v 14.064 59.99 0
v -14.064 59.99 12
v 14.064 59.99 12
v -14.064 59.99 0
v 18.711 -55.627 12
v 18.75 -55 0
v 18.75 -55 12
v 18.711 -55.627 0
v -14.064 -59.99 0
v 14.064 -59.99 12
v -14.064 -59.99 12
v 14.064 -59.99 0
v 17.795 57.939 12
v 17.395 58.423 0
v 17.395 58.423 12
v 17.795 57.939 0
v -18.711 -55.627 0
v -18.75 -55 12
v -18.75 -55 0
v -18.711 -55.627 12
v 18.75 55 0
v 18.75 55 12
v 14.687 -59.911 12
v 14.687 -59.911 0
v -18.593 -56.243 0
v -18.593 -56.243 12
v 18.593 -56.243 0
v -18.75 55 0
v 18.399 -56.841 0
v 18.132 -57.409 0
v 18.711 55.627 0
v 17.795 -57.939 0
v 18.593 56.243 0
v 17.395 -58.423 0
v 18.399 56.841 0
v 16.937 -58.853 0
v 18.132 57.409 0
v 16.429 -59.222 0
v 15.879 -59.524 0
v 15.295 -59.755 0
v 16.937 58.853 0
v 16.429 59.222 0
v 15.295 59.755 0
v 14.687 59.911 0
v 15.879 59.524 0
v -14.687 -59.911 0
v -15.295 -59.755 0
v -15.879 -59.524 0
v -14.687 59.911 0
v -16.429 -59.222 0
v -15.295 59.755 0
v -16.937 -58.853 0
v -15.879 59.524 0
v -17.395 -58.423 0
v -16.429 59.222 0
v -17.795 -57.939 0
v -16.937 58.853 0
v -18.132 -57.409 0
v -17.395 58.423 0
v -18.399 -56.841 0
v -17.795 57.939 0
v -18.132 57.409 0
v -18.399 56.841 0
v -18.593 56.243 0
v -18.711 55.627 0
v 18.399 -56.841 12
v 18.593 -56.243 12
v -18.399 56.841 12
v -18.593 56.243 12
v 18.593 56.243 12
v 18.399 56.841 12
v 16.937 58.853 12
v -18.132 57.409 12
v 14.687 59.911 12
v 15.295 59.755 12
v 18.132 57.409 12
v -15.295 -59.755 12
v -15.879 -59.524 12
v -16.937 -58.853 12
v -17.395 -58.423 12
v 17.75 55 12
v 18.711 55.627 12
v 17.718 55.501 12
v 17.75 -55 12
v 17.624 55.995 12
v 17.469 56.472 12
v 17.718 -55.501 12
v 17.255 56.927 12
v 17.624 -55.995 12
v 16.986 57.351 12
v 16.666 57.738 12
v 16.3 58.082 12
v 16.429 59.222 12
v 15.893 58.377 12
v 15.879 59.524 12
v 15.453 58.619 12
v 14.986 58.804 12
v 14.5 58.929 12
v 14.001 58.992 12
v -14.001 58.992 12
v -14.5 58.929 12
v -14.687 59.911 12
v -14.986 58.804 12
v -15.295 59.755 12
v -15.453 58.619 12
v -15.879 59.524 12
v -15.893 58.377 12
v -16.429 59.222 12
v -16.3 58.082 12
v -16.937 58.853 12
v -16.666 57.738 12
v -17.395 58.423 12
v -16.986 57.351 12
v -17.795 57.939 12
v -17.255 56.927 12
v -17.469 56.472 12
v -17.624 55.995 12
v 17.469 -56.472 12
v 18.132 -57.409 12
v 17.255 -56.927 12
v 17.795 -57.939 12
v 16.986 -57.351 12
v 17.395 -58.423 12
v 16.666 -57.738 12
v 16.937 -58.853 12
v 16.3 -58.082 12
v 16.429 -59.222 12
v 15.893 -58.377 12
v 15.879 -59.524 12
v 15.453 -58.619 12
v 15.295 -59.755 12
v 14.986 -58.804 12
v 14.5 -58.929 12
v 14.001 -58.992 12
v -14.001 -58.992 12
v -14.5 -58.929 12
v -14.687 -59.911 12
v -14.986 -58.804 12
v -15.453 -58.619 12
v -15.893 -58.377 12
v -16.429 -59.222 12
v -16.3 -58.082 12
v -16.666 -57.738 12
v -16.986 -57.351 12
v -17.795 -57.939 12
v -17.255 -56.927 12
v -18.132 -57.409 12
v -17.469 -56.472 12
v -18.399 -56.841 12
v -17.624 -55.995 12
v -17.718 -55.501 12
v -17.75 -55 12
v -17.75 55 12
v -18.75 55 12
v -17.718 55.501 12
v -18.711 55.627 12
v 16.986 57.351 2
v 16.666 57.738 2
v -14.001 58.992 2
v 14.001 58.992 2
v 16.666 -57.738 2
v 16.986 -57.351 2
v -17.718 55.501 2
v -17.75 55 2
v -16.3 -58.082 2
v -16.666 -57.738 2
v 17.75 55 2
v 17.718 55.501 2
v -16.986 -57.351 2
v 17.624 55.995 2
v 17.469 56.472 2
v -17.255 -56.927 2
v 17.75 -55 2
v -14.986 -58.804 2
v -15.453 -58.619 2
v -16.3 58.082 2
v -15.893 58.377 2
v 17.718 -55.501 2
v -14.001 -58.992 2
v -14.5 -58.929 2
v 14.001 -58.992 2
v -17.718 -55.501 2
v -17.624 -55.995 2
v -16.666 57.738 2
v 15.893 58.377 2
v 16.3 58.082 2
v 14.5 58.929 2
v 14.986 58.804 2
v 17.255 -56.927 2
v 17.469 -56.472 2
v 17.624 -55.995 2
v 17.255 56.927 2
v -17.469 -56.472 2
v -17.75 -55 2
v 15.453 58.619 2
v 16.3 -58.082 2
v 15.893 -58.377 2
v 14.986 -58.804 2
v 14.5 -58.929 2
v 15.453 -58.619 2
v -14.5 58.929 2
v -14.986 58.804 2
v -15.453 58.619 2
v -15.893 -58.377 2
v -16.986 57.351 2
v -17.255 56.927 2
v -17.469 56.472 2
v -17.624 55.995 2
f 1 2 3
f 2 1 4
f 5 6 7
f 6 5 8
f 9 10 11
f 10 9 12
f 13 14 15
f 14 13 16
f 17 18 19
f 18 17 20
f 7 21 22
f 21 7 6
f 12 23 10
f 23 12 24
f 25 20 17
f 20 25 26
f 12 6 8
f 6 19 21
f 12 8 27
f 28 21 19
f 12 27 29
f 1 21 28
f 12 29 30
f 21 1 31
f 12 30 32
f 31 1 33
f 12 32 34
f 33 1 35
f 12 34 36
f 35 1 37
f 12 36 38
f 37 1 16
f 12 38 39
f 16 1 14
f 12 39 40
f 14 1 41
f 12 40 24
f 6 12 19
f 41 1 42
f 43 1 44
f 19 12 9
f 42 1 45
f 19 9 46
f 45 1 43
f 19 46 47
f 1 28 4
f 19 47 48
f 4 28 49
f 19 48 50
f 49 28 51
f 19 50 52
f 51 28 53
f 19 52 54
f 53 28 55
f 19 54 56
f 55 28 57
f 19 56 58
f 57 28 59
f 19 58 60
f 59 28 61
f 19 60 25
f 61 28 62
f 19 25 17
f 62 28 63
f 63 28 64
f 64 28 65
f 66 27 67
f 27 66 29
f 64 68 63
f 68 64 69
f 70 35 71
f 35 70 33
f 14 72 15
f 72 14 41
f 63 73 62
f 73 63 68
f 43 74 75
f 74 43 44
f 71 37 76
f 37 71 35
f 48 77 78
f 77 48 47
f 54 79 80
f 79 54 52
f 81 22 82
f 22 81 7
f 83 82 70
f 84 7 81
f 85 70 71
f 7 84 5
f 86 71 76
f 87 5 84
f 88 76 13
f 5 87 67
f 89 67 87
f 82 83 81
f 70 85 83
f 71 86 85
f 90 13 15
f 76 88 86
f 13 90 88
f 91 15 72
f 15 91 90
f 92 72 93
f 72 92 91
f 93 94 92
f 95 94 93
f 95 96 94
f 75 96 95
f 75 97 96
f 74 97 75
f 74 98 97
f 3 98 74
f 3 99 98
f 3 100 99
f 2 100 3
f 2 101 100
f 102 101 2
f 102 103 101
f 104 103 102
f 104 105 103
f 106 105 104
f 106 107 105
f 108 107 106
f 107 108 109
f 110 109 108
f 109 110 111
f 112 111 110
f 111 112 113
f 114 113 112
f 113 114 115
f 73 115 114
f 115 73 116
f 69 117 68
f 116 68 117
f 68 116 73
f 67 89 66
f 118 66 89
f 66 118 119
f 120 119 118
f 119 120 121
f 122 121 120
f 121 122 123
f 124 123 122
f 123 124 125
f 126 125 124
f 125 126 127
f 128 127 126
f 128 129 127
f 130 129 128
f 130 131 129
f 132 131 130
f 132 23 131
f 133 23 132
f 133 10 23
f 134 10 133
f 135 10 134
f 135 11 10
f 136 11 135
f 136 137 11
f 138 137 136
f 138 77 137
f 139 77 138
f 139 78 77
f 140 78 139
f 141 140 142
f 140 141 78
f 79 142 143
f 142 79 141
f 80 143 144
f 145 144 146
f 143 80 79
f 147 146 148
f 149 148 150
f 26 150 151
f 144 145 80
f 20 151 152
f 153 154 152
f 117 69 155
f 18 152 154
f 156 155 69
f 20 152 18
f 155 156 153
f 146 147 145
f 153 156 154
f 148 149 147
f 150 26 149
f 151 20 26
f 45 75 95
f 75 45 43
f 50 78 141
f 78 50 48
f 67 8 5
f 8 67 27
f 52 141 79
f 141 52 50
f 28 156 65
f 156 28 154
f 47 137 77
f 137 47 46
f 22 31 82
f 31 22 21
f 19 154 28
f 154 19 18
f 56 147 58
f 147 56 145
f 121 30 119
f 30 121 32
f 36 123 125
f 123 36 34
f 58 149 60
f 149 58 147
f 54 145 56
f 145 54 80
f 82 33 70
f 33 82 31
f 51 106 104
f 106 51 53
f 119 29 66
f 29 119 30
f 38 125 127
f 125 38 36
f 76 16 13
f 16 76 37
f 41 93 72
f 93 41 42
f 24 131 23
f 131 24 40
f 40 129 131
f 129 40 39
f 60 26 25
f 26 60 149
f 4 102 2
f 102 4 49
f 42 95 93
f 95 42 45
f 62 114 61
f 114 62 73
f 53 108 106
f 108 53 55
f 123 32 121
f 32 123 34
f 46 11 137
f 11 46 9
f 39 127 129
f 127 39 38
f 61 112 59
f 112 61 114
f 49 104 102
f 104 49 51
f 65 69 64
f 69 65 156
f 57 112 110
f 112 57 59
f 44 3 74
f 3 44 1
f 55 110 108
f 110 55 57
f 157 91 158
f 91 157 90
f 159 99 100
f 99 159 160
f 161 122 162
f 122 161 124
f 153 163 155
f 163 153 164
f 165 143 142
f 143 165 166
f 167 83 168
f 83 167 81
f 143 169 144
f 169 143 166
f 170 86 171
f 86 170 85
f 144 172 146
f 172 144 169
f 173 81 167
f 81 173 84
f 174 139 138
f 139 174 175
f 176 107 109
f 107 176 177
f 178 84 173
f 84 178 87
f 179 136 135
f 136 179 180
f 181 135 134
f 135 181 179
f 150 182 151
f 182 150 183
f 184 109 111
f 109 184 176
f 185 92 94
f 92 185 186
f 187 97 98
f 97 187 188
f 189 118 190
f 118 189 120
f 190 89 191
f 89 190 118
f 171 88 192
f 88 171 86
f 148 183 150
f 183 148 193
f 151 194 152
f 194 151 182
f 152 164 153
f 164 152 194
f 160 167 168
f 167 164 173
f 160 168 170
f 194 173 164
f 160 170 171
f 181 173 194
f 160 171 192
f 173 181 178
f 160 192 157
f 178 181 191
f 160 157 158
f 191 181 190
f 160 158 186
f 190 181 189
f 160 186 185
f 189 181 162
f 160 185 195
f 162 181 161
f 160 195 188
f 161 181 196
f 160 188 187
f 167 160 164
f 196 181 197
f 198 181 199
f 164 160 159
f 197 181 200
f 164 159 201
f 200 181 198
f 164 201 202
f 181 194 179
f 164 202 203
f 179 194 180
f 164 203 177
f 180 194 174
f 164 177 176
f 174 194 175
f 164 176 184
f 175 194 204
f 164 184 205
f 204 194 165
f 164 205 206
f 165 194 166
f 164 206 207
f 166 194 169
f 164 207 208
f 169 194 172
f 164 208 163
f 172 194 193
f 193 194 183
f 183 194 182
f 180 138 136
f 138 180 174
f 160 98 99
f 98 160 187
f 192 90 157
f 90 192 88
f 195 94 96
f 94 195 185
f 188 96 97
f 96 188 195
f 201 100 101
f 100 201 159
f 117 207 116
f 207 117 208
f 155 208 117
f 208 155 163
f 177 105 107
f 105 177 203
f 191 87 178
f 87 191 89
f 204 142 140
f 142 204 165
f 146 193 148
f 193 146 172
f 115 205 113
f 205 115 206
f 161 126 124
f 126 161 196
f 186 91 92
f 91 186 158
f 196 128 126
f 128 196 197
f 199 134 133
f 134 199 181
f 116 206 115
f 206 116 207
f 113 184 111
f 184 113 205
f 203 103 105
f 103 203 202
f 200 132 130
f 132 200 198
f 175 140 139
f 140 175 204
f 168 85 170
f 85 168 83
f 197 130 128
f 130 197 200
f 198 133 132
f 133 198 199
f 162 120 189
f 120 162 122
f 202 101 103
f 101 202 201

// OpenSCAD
$fn = 50;


difference() {
	union() {
		hull() {
			translate(v = [-13.7500000000, 55.0000000000, 0]) {
				cylinder(h = 12, r = 5);
			}
			translate(v = [13.7500000000, 55.0000000000, 0]) {
				cylinder(h = 12, r = 5);
			}
			translate(v = [-13.7500000000, -55.0000000000, 0]) {
				cylinder(h = 12, r = 5);
			}
			translate(v = [13.7500000000, -55.0000000000, 0]) {
				cylinder(h = 12, r = 5);
			}
		}
	}
	union() {
		translate(v = [0, 0, 2]) {
			hull() {
				translate(v = [-13.7500000000, 55.0000000000, 0]) {
					cylinder(h = 10, r = 4);
				}
				translate(v = [13.7500000000, 55.0000000000, 0]) {
					cylinder(h = 10, r = 4);
				}
				translate(v = [-13.7500000000, -55.0000000000, 0]) {
					cylinder(h = 10, r = 4);
				}
				translate(v = [13.7500000000, -55.0000000000, 0]) {
					cylinder(h = 10, r = 4);
				}
			}
		}
	}
}
